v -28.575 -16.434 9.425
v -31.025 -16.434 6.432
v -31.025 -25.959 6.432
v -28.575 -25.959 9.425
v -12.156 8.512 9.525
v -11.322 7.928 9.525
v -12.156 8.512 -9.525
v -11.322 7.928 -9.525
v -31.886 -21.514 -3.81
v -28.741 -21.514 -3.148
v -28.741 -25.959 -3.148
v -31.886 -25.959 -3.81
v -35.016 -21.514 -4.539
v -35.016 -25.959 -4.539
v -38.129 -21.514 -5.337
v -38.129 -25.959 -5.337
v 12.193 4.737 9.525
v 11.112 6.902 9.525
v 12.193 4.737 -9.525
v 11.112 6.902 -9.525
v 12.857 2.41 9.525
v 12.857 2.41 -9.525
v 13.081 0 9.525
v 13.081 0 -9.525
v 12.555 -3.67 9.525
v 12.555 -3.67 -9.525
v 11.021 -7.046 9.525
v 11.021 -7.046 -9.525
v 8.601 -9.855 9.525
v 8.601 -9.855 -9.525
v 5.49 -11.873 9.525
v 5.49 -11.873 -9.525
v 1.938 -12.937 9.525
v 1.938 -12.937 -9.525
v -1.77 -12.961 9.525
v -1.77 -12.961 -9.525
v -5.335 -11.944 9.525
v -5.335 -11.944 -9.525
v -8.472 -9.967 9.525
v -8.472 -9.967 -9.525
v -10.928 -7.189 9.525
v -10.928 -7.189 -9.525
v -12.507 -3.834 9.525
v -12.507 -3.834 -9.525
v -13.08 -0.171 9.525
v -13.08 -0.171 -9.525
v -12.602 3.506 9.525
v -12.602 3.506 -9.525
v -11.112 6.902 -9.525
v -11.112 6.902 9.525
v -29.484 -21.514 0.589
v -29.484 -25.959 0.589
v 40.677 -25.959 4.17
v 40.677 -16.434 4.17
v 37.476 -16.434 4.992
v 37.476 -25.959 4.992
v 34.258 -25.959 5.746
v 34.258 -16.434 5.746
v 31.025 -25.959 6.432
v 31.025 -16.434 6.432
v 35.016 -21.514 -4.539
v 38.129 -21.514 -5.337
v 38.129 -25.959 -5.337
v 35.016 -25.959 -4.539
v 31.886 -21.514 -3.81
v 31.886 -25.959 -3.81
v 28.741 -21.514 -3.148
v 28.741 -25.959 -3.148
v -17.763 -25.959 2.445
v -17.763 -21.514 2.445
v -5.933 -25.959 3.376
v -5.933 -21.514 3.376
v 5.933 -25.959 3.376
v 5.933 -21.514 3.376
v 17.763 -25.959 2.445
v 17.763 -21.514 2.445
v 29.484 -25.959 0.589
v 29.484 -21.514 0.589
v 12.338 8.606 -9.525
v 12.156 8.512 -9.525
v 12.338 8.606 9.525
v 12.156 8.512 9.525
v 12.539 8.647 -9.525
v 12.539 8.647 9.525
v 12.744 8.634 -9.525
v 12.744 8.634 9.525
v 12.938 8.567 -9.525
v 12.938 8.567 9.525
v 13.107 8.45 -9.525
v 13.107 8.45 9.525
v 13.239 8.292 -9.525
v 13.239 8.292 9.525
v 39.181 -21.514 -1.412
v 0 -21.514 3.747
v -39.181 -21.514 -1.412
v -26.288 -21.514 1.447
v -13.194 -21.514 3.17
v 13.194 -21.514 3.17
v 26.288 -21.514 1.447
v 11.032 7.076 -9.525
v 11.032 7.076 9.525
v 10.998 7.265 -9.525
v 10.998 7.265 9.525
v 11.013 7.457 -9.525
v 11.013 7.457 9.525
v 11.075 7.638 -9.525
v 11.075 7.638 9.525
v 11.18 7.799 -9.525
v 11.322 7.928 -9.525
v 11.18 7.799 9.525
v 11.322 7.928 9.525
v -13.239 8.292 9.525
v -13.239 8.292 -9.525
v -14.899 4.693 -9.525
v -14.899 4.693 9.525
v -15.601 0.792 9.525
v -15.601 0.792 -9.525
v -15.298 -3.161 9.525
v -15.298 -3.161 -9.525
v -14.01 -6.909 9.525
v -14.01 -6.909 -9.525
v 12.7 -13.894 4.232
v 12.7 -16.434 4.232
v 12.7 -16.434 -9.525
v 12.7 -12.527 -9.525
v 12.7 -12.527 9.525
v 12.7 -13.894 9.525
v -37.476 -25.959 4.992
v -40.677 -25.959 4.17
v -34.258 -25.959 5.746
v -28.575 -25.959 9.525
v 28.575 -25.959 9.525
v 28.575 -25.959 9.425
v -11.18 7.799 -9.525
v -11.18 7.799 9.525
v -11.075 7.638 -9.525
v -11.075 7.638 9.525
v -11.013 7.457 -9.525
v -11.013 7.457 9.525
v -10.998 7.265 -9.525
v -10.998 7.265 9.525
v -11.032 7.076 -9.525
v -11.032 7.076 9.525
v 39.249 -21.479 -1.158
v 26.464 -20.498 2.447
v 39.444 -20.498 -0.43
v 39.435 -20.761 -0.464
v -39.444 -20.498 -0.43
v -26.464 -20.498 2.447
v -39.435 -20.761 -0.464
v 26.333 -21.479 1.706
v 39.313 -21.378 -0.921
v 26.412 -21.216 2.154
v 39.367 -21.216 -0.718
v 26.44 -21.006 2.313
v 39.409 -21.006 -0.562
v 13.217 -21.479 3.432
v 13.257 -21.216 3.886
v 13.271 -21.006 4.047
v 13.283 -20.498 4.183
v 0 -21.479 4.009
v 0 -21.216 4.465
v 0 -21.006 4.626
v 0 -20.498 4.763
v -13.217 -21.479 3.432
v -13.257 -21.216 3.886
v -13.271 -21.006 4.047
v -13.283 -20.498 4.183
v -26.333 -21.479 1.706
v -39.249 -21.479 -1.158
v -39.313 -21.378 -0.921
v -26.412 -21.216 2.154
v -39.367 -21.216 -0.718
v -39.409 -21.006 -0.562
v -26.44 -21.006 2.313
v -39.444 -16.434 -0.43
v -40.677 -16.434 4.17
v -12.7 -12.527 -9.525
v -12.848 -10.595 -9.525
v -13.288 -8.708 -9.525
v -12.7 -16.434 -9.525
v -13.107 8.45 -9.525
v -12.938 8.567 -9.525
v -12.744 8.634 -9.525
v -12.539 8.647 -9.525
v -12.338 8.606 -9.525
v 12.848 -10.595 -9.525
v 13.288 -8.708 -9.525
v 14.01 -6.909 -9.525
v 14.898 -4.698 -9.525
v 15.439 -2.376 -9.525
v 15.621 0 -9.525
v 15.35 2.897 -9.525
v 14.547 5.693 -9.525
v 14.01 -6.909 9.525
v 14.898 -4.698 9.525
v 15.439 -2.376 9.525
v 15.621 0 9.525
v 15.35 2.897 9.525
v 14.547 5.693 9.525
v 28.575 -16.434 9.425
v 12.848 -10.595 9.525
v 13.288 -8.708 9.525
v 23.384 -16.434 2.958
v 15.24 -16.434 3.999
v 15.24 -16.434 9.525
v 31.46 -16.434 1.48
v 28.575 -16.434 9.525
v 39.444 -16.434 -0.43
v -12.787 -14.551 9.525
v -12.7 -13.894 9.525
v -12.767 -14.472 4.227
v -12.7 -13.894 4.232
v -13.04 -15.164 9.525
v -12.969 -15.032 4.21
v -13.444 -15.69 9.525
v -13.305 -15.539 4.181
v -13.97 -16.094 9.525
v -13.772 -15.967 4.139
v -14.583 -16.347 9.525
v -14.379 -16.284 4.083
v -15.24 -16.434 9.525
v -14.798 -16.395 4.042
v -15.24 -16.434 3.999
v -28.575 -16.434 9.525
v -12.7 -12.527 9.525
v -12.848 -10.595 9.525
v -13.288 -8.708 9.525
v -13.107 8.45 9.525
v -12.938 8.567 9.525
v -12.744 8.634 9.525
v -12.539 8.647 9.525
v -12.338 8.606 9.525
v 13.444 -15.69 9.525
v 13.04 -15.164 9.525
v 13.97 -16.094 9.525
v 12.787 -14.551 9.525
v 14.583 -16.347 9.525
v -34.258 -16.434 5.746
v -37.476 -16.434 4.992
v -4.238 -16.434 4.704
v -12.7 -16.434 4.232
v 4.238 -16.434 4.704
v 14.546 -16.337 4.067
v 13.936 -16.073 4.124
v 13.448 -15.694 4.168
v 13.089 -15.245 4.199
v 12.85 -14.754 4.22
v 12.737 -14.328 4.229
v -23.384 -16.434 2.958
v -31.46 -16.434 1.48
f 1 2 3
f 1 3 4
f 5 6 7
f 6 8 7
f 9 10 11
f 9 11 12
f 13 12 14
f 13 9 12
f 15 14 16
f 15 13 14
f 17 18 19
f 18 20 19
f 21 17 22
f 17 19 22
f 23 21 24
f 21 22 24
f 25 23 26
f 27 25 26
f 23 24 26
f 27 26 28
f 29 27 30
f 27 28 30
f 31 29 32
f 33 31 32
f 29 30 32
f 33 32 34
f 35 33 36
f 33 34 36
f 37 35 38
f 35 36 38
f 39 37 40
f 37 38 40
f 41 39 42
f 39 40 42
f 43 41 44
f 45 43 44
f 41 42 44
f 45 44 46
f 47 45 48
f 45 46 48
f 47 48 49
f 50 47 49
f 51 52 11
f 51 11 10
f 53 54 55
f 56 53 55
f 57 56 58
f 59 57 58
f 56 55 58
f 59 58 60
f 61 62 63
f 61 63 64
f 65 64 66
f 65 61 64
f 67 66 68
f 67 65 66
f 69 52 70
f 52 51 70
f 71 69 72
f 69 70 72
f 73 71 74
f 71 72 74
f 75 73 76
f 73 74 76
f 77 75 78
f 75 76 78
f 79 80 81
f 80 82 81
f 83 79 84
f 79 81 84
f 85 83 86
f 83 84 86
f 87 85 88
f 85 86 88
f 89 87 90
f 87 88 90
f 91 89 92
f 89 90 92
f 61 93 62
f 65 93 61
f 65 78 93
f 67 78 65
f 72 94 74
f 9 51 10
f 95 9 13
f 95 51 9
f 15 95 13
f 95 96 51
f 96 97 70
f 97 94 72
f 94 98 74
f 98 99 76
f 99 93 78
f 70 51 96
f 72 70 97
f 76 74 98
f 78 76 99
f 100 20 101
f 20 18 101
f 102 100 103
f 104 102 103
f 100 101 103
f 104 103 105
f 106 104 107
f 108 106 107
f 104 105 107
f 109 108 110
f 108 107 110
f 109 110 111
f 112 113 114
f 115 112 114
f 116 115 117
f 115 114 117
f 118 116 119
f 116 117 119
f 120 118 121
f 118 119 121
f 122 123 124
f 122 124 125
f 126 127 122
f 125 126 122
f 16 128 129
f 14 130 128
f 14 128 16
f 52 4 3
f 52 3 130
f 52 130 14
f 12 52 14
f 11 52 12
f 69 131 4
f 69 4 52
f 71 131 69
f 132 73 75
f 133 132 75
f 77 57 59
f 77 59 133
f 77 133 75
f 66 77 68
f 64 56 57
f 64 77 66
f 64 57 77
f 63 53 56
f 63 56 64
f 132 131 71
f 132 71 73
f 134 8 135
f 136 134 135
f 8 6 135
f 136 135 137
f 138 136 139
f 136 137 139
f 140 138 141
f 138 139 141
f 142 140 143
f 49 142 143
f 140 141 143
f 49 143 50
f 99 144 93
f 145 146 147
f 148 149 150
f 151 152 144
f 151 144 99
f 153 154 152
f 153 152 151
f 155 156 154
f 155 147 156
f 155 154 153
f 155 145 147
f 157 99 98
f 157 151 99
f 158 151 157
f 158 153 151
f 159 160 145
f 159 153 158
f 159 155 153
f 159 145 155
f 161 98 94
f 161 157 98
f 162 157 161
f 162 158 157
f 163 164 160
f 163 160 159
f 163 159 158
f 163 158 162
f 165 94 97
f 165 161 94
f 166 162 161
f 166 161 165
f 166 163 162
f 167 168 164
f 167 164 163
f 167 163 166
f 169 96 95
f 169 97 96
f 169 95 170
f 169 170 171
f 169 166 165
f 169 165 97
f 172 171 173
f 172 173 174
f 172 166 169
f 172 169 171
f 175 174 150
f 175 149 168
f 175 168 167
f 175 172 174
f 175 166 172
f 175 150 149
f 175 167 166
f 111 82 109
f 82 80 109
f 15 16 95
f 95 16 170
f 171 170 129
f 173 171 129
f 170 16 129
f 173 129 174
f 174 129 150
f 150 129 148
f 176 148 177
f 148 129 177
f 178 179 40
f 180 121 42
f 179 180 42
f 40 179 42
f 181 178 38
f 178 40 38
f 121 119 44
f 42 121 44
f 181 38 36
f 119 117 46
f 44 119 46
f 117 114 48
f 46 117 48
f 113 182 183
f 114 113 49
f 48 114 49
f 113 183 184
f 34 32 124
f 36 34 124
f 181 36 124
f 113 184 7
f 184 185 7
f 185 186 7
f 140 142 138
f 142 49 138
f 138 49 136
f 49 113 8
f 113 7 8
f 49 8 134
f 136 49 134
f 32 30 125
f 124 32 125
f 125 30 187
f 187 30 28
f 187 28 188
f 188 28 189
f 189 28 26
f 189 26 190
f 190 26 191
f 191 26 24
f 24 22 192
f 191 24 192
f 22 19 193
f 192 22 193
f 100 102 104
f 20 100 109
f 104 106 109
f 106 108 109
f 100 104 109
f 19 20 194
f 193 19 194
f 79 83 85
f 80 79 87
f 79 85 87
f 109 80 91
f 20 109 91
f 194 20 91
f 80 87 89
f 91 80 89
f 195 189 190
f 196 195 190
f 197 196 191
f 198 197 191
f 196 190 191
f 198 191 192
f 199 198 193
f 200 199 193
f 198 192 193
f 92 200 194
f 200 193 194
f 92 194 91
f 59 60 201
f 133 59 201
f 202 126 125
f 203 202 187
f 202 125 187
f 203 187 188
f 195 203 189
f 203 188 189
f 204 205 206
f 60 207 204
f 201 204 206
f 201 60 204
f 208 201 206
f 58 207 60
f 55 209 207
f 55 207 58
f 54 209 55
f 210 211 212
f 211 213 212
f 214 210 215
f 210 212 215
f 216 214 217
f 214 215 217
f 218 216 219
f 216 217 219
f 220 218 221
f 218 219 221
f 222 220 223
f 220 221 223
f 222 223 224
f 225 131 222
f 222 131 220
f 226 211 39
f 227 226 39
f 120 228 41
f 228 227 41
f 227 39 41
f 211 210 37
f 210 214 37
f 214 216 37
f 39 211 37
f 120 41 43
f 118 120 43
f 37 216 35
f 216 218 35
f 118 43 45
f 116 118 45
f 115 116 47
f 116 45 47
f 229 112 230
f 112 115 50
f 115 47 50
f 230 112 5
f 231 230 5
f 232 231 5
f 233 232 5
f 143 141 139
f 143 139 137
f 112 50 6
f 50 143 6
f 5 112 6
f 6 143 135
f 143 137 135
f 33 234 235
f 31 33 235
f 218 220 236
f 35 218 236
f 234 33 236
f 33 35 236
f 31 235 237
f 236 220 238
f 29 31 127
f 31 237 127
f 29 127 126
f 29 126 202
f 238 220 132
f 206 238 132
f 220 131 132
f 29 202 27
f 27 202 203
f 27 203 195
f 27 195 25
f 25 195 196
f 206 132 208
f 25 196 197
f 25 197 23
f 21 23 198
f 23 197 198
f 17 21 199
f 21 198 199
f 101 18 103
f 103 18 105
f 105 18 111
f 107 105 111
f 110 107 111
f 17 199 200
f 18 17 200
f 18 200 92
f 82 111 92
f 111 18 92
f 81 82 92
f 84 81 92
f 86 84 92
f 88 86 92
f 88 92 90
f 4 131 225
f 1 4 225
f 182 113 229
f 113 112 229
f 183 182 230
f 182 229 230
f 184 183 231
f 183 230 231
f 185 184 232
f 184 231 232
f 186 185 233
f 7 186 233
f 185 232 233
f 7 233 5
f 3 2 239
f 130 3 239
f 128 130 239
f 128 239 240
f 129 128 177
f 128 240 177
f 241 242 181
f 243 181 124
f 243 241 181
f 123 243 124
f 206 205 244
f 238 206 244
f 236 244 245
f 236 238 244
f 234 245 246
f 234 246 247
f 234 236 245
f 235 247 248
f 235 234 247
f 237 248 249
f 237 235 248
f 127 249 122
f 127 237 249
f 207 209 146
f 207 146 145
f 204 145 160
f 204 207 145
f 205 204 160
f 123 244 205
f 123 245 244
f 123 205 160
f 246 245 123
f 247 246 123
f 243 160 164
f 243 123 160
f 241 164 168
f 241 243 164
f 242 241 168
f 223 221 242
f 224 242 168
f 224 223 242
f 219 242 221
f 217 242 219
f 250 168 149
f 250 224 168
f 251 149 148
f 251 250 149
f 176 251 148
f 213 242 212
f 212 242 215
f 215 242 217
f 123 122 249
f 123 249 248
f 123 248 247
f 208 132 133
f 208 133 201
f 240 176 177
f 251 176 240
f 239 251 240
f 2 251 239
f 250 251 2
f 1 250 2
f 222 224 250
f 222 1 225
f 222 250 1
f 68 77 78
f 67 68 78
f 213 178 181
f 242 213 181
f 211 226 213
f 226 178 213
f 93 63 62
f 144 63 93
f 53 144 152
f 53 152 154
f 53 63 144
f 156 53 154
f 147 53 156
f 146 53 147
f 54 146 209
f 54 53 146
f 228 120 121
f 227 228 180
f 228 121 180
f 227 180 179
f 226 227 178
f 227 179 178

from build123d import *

# Parameters (mm, degrees)
F1_DEPTH       = 9.525
F2_DEPTH       = 9.525
F3_T1_DEPTH    = 19.05
F3_T3_DEPTH    = 9.525
F3_T5_DEPTH    = 9.525
F4_R           = 0.762
F6_W           = 9.525
F6_H           = 3.81
F6_W_2         = 4.445
F7_ANGLE_BACK  = 15
F7_ANGLE       = 30
F8_R           = 1.016
F9_DEPTH       = 28.575
F10_R          = 2.54
F11_T1_DEPTH   = 9.525
F12_ANGLE_BACK = 11.25
F12_ANGLE      = 22.5


# Not quite as in the source:
# - a fillet or chamfer that OpenCascade refuses, or shapes differently, is made with other operations: its cross-section is extruded or revolved along the edge and cut away or added


with BuildPart() as f1:
    # F0 (on Top) → F1 (new body, symmetric)
    with BuildSketch(Plane.XY):
        with BuildLine():
            ThreePointArc((12.7, -9.0953637091), (14.8728333044, -4.7764495705), (15.621, 0))
            ThreePointArc((15.621, 0), (14.8980124876, 4.6973252941), (12.7959740838, 8.9598375122))
            Line((12.7959740838, 8.9598375122), (10.7153278913, 7.5029533639))
            ThreePointArc((10.7153278913, 7.5029533639), (12.4755714327, 3.9335325633), (13.081, 0))
            ThreePointArc((13.081, 0), (-3.9335325633, -12.4755714327), (-10.7153278913, 7.5029533639))
            Line((-10.7153278913, 7.5029533639), (-12.7959740838, 8.9598375122))
            ThreePointArc((-12.7959740838, 8.9598375122), (-15.6207793149, -0.0830336901), (-12.7, -9.0953637091))
            ThreePointArc((-12.7, -9.0953637091), (0, -15.621), (12.7, -9.0953637091))
        make_face()
    extrude(amount=F1_DEPTH, both=True)

    # F0 (on Top) → F2 (join, symmetric)
    with BuildSketch(Plane.XY):
        with BuildLine():
            Line((12.7, -16.4338), (12.7, -9.0953637091))
            ThreePointArc((12.7, -9.0953637091), (0, -15.621), (-12.7, -9.0953637091))
            Line((-12.7, -9.0953637091), (-12.7, -16.4338))
            Line((-12.7, -16.4338), (12.7, -16.4338))
        make_face()
    extrude(amount=F2_DEPTH, both=True)

    # F3: fillet of radius 12.7 on 3 edges, made by hand

    # F3_s2 → F3_t1 (join)
    with BuildSketch(Plane.XY.offset(-9.525)):
        with BuildLine():
            ThreePointArc((-14.0098654709, -6.9093639714), (-13.0318006864, -9.6427001587), (-12.7, -12.5267330538))
            Line((-12.7, -12.5267330538), (-12.7, -9.0953637091))
            ThreePointArc((-12.7, -9.0953637091), (-13.3995849593, -8.0291197475), (-14.0098654709, -6.9093639714))
        make_face()
    extrude(amount=F3_T1_DEPTH)

    # F3_s4 → F3_t3 (join)
    with BuildSketch(Plane.XY):
        with BuildLine():
            ThreePointArc((14.0098654709, -6.9093639714), (13.0318006864, -9.6427001587), (12.7, -12.5267330538))
            Line((12.7, -12.5267330538), (12.7, -9.0953637091))
            ThreePointArc((12.7, -9.0953637091), (13.3995849593, -8.0291197475), (14.0098654709, -6.9093639714))
        make_face()
    extrude(amount=F3_T3_DEPTH)

    # F3_s6 → F3_t5 (join)
    with BuildSketch(Plane.XY.offset(-9.525)):
        with BuildLine():
            ThreePointArc((12.7, -12.5267330538), (13.0318006864, -9.6427001587), (14.0098654709, -6.9093639714))
            ThreePointArc((14.0098654709, -6.9093639714), (13.3995849593, -8.0291197475), (12.7, -9.0953637091))
            Line((12.7, -9.0953637091), (12.7, -12.5267330538))
        make_face()
    extrude(amount=F3_T5_DEPTH)

    # F4
    f4_edges = [f1.edges().sort_by_distance(p)[0] for p in [
        (-12.795974, 8.959838, 0),
        (-10.715328, 7.502953, -4.7625),
        (-10.715328, 7.502953, 4.7625),
        (12.795974, 8.959838, 4.7625),
        (12.795974, 8.959838, -4.7625),
        (10.715328, 7.502953, 4.7625),
        (10.715328, 7.502953, -4.7625),
    ]]
    fillet(f4_edges, radius=F4_R)

    # F6 (on Right) → F7 (revolve)
    with BuildSketch(Plane.YZ, mode=Mode.PRIVATE) as f7_sk:
        with Locations((-21.1963, 7.62)):
            Rectangle(F6_W, F6_H)
        Polygon((-16.4338, 4.7625), (-16.4338, 5.715), (-25.9588, 5.715), (-25.9588, 3.4925), (-21.5138, 3.4925), (-21.5138, 4.7625), align=None)
        with Locations((-23.7363, 1.5875)):
            Rectangle(F6_W_2, F6_H)
    revolve(f7_sk.sketch.rotate(Axis((0, -16.4338, -147.6375), (0, -1, 0)), -F7_ANGLE_BACK), axis=Axis((0, -16.4338, -147.6375), (0, -1, 0)), revolution_arc=F7_ANGLE)

    # F8
    f8_edges = [f1.edges().sort_by_distance(p)[0] for p in [
        (0, -21.5138, 4.7625),
    ]]
    fillet(f8_edges, radius=F8_R)

    # F6 (on Right) → F9 (join, symmetric)
    with BuildSketch(Plane.YZ):
        with Locations((-21.1963, 7.62)):
            Rectangle(F6_W, F6_H)
        Polygon((-16.4338, 4.7625), (-16.4338, 5.715), (-25.9588, 5.715), (-25.9588, 3.4925), (-21.5138, 3.4925), (-21.5138, 4.7625), align=None)
        with Locations((-23.7363, 1.5875)):
            Rectangle(F6_W_2, F6_H)
    extrude(amount=F9_DEPTH, both=True)

    # F10
    f10_edges = [f1.edges().sort_by_distance(p)[0] for p in [
        (-12.7, -16.4338, 6.878706),
        (12.7, -16.4338, 6.878706),
    ]]
    fillet(f10_edges, radius=F10_R)

    # F11: chamfer of 2.54 on 2 edges, made by hand

    # F11_s2 → F11_t1 (join)
    with BuildSketch(Plane.XZ.offset(16.4338)):
        with BuildLine():
            Line((-31.089435357, 6.3536630782), (-28.5106384895, 9.503518522))
            Line((-28.5106384895, 9.503518522), (-28.4598384895, 9.503518522))
            ThreePointArc((-28.4598384895, 9.503518522), (-28.5242, 8.2044800333), (-28.5242, 6.9054415446))
            Line((-28.5242, 6.9054415446), (-28.5657636364, 6.8554882705))
            ThreePointArc((-28.5657636364, 6.8554882705), (-29.8296810134, 6.6164348202), (-31.0794070503, 6.3038627463))
            Line((-31.0794070503, 6.3038627463), (-31.089435357, 6.3536630782))
        make_face()
        with BuildLine():
            Line((31.089435357, 6.3536630782), (28.5106384895, 9.503518522))
            Line((28.5106384895, 9.503518522), (28.4598384895, 9.503518522))
            ThreePointArc((28.4598384895, 9.503518522), (28.5242, 8.2044800333), (28.5242, 6.9054415446))
            Line((28.5242, 6.9054415446), (28.5657636364, 6.8554882705))
            ThreePointArc((28.5657636364, 6.8554882705), (29.8296810134, 6.6164348202), (31.0794070503, 6.3038627463))
            Line((31.0794070503, 6.3038627463), (31.089435357, 6.3536630782))
        make_face()
    extrude(amount=F11_T1_DEPTH)

    # F6 (on Right) → F12 (revolve, cut)
    with BuildSketch(Plane.YZ, mode=Mode.PRIVATE) as f12_sk:
        with Locations((-23.7363, 1.5875)):
            Rectangle(F6_W_2, F6_H)
    revolve(f12_sk.sketch.rotate(Axis((0, -25.9588, -147.6375), (0, 1, 0)), -F12_ANGLE_BACK), axis=Axis((0, -25.9588, -147.6375), (0, 1, 0)), revolution_arc=F12_ANGLE, mode=Mode.SUBTRACT)


solid = f1.part
